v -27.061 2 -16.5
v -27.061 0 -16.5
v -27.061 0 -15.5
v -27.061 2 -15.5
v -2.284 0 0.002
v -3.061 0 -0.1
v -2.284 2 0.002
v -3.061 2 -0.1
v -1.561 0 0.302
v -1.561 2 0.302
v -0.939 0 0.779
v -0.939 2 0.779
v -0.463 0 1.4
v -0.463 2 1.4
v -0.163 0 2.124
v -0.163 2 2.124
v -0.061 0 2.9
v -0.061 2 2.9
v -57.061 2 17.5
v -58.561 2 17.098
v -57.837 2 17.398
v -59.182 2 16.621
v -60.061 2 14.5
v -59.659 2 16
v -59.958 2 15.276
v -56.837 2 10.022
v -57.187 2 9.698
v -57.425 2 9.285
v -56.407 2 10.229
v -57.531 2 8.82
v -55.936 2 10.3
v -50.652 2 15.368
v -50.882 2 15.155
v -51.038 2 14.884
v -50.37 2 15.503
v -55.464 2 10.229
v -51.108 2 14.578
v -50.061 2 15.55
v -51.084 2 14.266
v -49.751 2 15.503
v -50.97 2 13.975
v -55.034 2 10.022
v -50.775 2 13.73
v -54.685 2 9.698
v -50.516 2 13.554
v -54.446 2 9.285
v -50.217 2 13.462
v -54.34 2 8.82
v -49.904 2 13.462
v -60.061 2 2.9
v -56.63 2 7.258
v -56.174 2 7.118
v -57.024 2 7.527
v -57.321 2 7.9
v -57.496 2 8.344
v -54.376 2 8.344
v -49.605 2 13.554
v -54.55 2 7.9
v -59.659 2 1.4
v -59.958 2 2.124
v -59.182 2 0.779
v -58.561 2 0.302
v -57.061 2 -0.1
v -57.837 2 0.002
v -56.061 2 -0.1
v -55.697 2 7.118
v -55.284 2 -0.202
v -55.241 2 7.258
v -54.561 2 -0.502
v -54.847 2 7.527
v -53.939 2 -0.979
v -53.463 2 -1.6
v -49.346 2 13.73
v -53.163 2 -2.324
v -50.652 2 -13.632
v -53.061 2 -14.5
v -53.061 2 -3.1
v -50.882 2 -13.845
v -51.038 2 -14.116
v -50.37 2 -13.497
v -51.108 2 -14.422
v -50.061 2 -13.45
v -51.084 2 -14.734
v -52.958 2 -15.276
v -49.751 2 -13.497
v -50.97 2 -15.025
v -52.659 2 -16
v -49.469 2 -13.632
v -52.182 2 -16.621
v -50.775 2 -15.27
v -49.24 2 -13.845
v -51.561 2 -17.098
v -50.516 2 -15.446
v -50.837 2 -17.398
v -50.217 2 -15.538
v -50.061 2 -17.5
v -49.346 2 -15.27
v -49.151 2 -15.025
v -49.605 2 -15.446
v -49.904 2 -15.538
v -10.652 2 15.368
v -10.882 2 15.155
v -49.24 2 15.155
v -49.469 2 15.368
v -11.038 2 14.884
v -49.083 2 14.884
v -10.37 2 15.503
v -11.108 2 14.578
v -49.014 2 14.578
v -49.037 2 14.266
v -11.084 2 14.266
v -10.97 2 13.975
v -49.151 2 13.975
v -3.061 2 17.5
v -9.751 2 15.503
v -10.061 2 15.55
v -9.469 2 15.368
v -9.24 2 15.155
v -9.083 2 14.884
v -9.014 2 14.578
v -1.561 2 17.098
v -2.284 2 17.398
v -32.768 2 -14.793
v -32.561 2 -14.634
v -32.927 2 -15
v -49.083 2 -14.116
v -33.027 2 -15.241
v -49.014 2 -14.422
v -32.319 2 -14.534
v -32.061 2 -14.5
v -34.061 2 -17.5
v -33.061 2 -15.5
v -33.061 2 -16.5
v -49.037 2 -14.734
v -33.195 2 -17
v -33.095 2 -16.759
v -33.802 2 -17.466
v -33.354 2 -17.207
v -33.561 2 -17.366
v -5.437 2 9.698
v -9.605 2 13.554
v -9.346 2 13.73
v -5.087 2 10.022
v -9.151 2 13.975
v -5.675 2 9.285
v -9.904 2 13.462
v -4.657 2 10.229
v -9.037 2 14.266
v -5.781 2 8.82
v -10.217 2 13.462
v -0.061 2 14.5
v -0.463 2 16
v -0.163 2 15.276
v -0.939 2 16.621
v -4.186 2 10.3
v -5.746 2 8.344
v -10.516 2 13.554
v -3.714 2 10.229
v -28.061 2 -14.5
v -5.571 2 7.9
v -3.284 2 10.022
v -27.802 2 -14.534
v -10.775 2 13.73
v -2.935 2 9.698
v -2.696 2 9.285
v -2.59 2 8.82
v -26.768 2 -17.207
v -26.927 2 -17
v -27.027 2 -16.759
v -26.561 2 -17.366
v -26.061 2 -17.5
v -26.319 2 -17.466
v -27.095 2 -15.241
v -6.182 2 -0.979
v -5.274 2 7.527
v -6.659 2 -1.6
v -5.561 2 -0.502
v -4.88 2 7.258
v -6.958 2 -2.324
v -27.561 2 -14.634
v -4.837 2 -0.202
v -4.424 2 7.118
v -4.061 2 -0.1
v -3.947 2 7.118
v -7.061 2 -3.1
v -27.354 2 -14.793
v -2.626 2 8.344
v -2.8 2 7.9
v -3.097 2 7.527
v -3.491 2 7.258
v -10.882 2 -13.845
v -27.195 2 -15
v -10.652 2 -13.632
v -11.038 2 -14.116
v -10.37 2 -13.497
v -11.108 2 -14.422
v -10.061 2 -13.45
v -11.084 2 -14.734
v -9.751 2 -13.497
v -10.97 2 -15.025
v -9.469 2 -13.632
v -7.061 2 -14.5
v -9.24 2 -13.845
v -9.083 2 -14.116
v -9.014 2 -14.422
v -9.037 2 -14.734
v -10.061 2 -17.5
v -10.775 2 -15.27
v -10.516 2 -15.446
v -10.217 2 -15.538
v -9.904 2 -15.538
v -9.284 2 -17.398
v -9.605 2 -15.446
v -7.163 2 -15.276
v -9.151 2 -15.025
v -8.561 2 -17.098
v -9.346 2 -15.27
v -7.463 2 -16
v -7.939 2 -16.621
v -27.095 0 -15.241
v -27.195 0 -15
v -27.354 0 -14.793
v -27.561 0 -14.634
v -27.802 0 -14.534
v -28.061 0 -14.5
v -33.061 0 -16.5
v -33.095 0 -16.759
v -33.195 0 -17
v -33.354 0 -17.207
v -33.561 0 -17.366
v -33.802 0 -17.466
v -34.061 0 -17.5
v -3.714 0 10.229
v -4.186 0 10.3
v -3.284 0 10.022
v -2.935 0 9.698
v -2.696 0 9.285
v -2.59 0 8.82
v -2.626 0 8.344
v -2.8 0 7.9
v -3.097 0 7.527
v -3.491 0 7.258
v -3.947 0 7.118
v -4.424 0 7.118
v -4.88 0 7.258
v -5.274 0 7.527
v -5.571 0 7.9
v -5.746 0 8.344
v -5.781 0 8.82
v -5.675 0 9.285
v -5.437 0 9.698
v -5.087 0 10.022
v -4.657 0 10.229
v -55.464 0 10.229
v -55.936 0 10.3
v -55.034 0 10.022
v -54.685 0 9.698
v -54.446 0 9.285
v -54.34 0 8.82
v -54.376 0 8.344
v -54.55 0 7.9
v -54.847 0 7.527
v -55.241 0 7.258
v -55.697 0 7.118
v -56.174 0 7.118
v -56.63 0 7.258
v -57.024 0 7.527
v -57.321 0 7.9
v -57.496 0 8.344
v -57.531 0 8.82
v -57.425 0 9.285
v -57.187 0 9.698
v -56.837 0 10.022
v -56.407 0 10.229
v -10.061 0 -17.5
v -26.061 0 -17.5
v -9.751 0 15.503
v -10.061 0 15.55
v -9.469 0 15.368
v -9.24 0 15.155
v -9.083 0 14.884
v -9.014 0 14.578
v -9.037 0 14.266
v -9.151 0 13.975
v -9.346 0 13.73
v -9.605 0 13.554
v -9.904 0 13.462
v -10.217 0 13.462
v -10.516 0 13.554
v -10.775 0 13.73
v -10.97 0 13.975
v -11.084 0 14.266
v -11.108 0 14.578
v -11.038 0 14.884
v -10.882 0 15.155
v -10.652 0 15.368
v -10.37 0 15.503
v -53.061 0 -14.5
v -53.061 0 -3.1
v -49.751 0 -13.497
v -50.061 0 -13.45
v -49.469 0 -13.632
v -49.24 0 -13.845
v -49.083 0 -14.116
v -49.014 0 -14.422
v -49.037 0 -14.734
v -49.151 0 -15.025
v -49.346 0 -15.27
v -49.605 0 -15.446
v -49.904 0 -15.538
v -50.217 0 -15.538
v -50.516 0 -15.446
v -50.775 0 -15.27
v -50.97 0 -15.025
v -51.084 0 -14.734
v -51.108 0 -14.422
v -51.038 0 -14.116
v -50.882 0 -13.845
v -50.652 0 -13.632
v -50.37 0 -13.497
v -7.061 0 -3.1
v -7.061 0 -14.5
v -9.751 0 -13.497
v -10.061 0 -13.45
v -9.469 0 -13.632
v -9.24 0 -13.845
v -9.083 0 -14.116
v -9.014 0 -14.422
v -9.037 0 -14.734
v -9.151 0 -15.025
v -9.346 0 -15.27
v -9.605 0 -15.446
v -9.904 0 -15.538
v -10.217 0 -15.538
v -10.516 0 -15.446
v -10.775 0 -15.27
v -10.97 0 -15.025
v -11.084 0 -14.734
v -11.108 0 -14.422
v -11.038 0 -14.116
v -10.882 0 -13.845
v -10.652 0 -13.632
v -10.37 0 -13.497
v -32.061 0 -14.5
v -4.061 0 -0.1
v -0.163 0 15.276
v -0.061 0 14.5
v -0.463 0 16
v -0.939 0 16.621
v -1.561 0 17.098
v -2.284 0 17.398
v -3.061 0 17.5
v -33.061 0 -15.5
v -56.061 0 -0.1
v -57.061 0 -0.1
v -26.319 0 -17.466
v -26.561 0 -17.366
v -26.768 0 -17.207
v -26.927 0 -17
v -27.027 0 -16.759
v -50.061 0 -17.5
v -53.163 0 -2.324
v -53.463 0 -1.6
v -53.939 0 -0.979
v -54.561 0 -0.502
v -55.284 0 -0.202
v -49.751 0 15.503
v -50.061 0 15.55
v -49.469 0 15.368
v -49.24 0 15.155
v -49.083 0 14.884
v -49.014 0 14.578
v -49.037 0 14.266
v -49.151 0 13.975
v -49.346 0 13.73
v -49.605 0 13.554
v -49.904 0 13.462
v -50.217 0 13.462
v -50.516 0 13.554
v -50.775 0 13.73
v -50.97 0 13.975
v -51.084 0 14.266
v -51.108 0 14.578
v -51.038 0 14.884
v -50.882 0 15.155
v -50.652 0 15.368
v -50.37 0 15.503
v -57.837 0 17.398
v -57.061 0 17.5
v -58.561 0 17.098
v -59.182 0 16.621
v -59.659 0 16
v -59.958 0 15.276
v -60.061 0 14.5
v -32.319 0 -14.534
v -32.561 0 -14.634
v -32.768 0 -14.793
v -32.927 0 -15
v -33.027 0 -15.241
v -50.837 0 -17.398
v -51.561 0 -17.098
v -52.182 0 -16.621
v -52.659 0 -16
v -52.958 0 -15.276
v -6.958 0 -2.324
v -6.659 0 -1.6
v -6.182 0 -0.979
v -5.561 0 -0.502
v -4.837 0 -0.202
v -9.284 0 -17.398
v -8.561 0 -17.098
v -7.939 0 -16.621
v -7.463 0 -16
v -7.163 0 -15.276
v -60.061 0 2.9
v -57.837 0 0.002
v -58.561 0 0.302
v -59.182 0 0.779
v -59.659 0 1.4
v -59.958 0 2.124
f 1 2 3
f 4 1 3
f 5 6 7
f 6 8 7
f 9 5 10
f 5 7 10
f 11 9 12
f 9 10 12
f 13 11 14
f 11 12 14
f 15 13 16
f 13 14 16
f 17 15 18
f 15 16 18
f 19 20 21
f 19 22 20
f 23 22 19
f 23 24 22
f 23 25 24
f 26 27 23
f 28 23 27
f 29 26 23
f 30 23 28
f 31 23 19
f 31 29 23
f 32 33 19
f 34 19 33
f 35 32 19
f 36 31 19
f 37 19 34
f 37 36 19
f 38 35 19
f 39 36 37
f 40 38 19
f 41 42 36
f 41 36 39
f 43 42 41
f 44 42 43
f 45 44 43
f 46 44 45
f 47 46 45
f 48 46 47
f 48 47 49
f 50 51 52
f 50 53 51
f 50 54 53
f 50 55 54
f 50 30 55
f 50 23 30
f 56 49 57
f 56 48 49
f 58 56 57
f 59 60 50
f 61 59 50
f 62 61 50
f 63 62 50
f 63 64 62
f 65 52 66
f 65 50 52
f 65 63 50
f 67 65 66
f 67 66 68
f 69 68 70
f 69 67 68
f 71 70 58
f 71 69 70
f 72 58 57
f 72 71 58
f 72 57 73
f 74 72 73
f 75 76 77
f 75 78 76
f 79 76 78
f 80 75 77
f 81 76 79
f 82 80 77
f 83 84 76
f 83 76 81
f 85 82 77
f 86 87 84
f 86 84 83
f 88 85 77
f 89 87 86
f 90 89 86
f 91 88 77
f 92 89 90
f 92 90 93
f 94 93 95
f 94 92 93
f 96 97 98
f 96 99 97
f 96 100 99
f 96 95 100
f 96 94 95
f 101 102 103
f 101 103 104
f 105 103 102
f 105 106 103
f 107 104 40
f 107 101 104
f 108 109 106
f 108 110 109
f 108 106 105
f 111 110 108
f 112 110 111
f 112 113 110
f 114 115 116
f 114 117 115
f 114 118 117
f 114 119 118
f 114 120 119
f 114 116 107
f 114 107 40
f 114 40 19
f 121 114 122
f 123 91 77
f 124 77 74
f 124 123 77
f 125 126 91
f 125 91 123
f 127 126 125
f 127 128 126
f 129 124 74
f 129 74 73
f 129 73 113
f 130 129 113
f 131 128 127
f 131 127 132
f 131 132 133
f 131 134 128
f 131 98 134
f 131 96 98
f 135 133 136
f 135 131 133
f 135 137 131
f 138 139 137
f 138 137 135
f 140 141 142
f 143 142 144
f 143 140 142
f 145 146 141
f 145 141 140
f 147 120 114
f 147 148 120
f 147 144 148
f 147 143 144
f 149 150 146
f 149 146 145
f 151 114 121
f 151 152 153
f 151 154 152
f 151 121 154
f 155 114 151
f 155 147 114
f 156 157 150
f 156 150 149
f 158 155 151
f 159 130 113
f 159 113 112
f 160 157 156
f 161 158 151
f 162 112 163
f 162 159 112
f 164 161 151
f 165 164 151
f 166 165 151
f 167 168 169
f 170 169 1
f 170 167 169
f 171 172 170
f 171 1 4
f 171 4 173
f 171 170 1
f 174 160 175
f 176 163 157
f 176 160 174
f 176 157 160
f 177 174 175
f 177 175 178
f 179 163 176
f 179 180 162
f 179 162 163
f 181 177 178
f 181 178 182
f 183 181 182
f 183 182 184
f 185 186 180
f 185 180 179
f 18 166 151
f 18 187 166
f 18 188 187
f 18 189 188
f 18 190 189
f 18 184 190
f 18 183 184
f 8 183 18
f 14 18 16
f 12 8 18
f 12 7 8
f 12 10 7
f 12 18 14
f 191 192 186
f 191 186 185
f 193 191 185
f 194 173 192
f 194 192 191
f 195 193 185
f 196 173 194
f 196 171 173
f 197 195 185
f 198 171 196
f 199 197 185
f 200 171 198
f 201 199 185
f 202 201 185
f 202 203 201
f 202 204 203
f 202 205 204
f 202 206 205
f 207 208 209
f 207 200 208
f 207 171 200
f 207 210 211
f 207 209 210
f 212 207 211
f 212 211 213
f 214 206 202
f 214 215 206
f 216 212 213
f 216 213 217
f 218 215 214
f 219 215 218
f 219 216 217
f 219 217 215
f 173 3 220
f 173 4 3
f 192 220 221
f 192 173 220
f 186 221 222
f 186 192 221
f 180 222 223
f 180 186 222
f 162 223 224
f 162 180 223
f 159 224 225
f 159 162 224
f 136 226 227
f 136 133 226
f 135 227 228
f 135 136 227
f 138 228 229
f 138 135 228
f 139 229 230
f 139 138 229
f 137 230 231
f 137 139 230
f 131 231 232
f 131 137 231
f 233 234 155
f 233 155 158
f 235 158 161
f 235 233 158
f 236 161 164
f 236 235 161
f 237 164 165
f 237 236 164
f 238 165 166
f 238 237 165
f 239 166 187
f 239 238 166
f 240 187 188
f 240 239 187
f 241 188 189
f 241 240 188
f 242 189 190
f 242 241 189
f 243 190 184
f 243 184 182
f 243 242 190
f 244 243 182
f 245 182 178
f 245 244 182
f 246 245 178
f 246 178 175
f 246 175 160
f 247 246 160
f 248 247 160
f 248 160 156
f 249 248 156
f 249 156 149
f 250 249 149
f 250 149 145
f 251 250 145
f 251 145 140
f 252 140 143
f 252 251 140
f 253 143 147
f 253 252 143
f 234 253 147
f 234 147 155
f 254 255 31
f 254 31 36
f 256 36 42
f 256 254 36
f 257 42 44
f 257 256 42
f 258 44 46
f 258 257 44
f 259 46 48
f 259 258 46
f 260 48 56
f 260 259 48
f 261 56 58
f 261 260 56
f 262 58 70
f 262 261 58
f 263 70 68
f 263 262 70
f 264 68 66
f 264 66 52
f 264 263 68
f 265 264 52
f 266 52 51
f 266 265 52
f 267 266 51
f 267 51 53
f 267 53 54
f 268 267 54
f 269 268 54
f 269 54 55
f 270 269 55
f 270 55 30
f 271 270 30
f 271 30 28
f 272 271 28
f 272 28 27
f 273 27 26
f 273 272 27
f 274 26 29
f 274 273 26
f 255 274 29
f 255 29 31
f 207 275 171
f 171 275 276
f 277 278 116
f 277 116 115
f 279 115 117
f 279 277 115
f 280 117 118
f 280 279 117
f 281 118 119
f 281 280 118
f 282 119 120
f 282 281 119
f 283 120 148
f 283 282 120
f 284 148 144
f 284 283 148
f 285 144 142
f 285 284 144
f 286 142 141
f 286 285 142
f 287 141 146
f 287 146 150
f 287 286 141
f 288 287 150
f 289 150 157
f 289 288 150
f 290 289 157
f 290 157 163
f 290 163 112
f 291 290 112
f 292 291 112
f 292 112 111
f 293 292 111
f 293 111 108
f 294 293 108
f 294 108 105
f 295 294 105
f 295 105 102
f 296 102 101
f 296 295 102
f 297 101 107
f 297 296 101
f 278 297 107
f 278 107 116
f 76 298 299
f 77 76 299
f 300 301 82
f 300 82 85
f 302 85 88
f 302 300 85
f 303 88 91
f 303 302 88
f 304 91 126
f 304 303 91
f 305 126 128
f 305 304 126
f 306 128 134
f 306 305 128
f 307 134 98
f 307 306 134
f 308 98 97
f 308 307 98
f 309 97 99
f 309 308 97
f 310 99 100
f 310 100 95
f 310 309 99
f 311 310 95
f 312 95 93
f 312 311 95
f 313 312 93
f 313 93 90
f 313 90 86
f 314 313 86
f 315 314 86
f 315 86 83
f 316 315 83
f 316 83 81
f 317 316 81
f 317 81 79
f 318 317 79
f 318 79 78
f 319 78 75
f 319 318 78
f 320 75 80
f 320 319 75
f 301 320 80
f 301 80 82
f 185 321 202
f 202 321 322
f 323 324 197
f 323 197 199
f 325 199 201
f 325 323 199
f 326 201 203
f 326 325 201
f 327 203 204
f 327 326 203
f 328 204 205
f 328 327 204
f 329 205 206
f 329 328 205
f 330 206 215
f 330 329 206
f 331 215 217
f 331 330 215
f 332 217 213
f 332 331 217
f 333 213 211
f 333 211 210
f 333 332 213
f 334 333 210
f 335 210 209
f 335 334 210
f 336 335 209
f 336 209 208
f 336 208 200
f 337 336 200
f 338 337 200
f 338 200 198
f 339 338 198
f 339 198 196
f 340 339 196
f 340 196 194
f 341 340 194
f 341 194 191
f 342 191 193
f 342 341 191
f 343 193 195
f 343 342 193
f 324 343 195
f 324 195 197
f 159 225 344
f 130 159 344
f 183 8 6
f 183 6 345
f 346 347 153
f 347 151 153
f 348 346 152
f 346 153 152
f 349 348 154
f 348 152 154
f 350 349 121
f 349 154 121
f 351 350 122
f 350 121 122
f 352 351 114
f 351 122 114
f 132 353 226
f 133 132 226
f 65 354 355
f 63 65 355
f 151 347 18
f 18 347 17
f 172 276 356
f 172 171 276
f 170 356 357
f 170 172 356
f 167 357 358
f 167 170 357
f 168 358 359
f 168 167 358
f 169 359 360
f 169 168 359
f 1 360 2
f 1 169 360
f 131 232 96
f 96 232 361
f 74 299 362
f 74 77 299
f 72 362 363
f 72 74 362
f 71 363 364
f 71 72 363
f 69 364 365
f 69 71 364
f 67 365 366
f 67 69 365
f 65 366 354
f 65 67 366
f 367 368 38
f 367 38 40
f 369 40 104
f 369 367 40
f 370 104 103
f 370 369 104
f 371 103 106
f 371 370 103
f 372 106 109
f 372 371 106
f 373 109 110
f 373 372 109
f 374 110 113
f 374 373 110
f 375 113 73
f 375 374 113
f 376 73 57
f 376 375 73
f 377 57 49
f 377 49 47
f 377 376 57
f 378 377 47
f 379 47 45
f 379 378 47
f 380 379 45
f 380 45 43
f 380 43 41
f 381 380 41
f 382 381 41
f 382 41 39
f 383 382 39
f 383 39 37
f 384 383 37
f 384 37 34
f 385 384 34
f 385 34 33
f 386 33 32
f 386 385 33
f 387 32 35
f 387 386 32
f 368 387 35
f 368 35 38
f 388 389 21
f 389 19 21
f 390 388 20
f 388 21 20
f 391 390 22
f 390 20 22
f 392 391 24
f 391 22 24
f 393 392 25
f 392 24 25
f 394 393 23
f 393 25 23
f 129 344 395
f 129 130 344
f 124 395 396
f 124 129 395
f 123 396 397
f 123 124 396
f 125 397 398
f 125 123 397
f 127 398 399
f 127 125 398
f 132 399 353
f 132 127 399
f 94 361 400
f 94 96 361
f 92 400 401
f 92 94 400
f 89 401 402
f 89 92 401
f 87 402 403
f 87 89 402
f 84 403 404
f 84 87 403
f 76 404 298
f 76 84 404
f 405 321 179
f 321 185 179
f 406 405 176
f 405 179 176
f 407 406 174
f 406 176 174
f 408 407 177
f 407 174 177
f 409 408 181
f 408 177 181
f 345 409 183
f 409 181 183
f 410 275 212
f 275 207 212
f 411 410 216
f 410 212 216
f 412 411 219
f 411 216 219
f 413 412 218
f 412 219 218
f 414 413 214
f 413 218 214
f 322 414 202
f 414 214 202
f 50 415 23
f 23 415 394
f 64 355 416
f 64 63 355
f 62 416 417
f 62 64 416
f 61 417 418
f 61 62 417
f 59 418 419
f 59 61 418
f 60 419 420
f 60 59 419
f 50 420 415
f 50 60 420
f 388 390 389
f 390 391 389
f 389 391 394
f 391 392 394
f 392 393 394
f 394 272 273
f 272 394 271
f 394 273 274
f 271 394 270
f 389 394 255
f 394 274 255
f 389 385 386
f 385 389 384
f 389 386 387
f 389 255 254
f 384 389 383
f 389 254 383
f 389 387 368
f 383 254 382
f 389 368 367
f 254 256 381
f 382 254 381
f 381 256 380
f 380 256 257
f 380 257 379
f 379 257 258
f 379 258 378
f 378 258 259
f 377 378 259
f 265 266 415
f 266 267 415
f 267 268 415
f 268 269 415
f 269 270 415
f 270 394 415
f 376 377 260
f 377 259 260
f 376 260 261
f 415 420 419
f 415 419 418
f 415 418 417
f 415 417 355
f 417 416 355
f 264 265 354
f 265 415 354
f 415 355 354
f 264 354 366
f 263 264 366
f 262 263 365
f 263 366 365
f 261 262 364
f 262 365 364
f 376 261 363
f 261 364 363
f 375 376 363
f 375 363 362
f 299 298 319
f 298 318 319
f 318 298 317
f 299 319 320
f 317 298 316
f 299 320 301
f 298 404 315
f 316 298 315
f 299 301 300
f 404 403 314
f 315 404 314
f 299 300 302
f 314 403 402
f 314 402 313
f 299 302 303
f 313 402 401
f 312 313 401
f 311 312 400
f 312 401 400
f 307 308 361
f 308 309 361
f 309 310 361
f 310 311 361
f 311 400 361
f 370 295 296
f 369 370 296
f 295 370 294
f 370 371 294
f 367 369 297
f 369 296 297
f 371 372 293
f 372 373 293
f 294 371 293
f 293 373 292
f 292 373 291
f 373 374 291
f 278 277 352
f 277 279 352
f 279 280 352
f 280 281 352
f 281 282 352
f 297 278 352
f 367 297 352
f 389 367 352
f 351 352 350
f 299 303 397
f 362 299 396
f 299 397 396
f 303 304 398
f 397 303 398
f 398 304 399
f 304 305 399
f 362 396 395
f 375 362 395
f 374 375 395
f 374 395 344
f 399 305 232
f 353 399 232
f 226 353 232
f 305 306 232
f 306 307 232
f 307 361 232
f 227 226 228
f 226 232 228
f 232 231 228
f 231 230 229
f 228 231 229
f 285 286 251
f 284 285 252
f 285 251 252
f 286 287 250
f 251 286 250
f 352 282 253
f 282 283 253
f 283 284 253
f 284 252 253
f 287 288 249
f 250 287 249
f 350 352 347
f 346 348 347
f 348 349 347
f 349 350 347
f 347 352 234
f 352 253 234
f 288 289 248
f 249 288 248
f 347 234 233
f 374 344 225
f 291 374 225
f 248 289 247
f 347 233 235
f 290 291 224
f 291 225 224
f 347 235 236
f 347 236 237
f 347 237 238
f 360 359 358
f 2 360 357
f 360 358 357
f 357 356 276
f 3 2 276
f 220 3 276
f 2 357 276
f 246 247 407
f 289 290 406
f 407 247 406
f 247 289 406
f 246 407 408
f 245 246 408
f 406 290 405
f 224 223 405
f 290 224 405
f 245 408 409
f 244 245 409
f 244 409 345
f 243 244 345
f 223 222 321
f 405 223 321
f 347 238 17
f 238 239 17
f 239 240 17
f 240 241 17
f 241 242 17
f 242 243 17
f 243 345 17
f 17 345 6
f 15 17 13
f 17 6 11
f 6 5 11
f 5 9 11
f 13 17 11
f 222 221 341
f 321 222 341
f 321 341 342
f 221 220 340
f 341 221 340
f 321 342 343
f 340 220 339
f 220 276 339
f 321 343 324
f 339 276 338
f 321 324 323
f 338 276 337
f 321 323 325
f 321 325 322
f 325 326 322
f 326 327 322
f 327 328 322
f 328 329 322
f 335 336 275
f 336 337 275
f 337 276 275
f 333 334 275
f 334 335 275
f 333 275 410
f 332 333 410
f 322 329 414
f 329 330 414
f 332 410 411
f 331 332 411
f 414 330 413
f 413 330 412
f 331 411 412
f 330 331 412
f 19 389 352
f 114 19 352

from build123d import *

# Parameters (mm, degrees)
SKETCH1_R           = 1.6
SKETCH1_R_2         = 1.05
BOSS_EXTRUDE1_DEPTH = 2
FILLET1_R           = 3
FILLET2_R           = 1


with BuildPart() as part:
    # Sketch1 → Boss-Extrude1 (new body)
    with BuildSketch(Plane(origin=(0, 0, 0), x_dir=(1, 0, 0), z_dir=(0, 1, 0))):
        Polygon((-27.060616409, 17.5), (-27.060616409, 14.5), (-33.060616409, 14.5), (-33.060616409, 17.5), (-53.060616409, 17.5), (-53.060616409, 0.1), (-60.060616409, 0.1), (-60.060616409, -17.5), (-30.060616409, -17.5), (-0.060616409, -17.5), (-0.060616409, 0.1), (-7.060616409, 0.1), (-7.060616409, 17.5), align=None)
        with Locations(Location((-4.185616409, -8.7, 0), (0, 0, 270))):
            Circle(SKETCH1_R, mode=Mode.SUBTRACT)
        with Locations(Location((-55.935616409, -8.7, 0), (0, 0, 270))):
            Circle(SKETCH1_R, mode=Mode.SUBTRACT)
        with Locations(Location((-10.060616409, -14.5, 0), (0, 0, 270))):
            Circle(SKETCH1_R_2, mode=Mode.SUBTRACT)
        with Locations(Location((-50.060616409, -14.5, 0), (0, 0, 270))):
            Circle(SKETCH1_R_2, mode=Mode.SUBTRACT)
        with Locations(Location((-50.060616409, 14.5, 0), (0, 0, 270))):
            Circle(SKETCH1_R_2, mode=Mode.SUBTRACT)
        with Locations(Location((-10.060616409, 14.5, 0), (0, 0, 270))):
            Circle(SKETCH1_R_2, mode=Mode.SUBTRACT)
    extrude(amount=BOSS_EXTRUDE1_DEPTH)

    # Fillet1
    fillet1_edges = [part.edges().sort_by_distance(p)[0] for p in [
        (-7.060616409, 1, -17.5),
        (-7.060616409, 1, -0.1),
        (-0.060616409, 1, -0.1),
        (-0.060616409, 1, 17.5),
        (-60.060616409, 1, 17.5),
        (-60.060616409, 1, -0.1),
        (-53.060616409, 1, -0.1),
        (-53.060616409, 1, -17.5),
    ]]
    fillet(fillet1_edges, radius=FILLET1_R)

    # Fillet2
    fillet2_edges = [part.edges().sort_by_distance(p)[0] for p in [
        (-33.060616409, 1, -17.5),
        (-33.060616409, 1, -14.5),
        (-27.060616409, 1, -14.5),
        (-27.060616409, 1, -17.5),
    ]]
    fillet(fillet2_edges, radius=FILLET2_R)


solid = part.part
